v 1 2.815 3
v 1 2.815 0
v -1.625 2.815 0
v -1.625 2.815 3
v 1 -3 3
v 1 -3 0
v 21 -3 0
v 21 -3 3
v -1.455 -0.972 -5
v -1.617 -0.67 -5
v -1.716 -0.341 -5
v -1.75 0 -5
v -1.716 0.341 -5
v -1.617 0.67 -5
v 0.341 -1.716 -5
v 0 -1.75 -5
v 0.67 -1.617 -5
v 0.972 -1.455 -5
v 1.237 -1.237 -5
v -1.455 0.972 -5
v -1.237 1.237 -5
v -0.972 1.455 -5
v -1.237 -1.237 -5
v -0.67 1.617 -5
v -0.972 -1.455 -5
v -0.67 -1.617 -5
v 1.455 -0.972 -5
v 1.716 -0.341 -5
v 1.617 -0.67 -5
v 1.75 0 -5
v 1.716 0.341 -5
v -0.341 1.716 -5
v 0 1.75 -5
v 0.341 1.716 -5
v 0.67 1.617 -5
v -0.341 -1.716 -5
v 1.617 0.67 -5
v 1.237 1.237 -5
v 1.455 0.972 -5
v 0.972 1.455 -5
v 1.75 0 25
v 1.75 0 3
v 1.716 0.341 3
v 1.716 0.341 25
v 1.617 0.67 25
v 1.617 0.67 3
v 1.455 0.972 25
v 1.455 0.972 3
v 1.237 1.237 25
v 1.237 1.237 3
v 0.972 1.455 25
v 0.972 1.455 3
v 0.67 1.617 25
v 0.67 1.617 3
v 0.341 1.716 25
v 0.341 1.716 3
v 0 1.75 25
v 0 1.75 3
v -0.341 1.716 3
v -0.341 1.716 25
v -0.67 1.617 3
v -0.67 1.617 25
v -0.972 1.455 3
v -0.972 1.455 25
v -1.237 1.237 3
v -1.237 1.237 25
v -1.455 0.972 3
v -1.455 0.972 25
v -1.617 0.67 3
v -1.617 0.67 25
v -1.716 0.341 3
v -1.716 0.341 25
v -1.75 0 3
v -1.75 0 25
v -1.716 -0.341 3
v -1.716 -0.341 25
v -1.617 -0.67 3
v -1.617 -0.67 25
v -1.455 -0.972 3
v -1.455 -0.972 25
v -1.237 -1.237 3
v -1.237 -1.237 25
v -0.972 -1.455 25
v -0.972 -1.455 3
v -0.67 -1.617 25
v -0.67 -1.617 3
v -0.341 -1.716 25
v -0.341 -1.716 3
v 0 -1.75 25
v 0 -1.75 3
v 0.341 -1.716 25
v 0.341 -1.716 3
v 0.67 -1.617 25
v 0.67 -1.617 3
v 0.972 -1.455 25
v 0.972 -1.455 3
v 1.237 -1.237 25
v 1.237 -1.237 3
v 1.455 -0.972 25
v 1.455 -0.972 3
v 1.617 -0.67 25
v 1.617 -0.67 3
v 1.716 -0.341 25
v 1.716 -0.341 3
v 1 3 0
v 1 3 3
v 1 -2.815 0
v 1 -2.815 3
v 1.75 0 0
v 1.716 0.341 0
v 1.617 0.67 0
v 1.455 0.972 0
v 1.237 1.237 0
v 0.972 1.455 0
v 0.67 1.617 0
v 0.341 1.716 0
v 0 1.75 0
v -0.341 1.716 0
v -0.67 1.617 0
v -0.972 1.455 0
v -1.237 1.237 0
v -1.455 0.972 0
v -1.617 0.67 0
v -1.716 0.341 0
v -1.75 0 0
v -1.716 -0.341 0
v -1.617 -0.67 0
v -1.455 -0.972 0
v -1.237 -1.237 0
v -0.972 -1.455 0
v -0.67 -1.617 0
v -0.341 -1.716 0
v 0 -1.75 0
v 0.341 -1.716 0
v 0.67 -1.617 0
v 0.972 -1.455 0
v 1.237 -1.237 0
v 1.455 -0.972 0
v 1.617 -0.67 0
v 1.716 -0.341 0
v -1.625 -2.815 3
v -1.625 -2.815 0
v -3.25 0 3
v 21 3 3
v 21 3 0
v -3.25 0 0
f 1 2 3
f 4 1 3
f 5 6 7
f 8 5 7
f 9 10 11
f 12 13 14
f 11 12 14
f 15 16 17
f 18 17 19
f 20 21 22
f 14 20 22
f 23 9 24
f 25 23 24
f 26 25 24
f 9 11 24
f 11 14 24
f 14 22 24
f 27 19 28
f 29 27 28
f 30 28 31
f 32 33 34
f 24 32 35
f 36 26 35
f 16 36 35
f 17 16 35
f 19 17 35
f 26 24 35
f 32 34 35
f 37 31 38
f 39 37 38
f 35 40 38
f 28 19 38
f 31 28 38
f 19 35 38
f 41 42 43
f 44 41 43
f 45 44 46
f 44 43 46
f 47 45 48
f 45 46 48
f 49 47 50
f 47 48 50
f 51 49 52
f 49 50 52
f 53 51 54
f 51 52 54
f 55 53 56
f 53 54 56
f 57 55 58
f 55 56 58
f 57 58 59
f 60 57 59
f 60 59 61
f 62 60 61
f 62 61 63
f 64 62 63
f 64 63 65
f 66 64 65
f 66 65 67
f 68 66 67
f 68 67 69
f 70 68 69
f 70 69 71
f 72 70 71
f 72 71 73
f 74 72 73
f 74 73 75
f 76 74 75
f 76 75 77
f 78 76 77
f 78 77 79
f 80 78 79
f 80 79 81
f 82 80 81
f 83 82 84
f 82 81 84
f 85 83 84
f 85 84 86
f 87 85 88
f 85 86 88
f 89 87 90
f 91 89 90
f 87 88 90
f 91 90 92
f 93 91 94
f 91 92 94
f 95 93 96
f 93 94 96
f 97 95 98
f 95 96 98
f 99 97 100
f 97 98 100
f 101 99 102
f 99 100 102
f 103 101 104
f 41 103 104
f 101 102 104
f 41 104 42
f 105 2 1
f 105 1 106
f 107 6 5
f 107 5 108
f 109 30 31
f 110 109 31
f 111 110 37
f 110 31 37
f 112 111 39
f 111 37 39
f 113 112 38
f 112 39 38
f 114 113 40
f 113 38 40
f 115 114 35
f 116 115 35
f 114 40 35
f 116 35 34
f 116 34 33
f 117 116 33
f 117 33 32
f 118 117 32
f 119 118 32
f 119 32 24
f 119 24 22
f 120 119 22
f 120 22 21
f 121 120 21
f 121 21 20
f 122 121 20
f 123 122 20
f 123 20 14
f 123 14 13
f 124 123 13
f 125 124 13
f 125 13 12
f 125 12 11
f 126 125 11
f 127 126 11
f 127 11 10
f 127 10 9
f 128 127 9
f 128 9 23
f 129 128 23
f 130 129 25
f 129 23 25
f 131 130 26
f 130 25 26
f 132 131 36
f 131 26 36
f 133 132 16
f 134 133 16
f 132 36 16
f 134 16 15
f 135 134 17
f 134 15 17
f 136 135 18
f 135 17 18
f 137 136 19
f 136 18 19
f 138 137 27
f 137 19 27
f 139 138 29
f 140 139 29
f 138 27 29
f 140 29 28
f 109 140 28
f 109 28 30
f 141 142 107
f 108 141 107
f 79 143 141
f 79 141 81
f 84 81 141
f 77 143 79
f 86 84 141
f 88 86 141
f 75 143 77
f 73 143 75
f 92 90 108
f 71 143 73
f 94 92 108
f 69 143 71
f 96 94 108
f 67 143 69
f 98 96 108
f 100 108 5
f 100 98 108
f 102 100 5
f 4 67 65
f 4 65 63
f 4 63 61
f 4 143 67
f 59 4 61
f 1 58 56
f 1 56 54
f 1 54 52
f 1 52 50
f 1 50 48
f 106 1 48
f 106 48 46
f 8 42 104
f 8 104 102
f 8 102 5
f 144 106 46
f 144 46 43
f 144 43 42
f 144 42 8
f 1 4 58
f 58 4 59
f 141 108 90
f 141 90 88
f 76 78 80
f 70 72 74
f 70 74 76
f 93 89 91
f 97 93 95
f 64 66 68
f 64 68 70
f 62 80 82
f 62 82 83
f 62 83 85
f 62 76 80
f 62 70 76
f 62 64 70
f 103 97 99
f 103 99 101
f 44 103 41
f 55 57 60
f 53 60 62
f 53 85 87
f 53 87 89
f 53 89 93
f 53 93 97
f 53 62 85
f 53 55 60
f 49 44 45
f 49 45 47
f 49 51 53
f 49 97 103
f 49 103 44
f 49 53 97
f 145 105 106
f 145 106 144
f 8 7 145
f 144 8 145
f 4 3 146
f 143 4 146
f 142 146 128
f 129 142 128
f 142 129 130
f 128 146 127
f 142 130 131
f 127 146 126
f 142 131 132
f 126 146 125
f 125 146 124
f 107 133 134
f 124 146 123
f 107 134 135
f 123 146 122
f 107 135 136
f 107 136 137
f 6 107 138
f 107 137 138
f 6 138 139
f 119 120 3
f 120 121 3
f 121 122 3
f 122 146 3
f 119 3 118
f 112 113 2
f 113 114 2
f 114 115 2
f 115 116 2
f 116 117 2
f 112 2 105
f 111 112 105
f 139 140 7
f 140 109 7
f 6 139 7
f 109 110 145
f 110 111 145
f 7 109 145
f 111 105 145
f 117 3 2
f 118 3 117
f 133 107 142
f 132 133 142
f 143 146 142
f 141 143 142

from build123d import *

# Parameters (mm, degrees)
CYLINDER_R     = 1.75
CYLINDER_DEPTH = 30
BOX001_W       = 20
BOX001_H       = 6
BOX001_DEPTH   = 3
PRISM_DEPTH    = 3


with BuildPart() as cilindro:
    # Cylinder → Cylinder (new body)
    with BuildSketch(Plane.XY.offset(-5)):
        Circle(CYLINDER_R)
    extrude(amount=CYLINDER_DEPTH)


with BuildPart() as cubo001:
    # Box001 → Box001 (new body)
    with BuildSketch(Plane(origin=(1, -3, 0), x_dir=(1, 0, 0), z_dir=(0, 0, 1))):
        with Locations((10, 3)):
            Rectangle(BOX001_W, BOX001_H)
    extrude(amount=BOX001_DEPTH)


with BuildPart() as fusion:
    # Prism → Prism (new body)
    with BuildSketch(Plane.XY):
        Polygon((3.25, 0), (1.625, 2.814583), (-1.625, 2.814583), (-3.25, 0), (-1.625, -2.814583), (1.625, -2.814583), align=None)
    extrude(amount=PRISM_DEPTH)

    # Fusion: union Cilindro, Cubo001
    add(cilindro.part)
    add(cubo001.part)


solid = fusion.part
